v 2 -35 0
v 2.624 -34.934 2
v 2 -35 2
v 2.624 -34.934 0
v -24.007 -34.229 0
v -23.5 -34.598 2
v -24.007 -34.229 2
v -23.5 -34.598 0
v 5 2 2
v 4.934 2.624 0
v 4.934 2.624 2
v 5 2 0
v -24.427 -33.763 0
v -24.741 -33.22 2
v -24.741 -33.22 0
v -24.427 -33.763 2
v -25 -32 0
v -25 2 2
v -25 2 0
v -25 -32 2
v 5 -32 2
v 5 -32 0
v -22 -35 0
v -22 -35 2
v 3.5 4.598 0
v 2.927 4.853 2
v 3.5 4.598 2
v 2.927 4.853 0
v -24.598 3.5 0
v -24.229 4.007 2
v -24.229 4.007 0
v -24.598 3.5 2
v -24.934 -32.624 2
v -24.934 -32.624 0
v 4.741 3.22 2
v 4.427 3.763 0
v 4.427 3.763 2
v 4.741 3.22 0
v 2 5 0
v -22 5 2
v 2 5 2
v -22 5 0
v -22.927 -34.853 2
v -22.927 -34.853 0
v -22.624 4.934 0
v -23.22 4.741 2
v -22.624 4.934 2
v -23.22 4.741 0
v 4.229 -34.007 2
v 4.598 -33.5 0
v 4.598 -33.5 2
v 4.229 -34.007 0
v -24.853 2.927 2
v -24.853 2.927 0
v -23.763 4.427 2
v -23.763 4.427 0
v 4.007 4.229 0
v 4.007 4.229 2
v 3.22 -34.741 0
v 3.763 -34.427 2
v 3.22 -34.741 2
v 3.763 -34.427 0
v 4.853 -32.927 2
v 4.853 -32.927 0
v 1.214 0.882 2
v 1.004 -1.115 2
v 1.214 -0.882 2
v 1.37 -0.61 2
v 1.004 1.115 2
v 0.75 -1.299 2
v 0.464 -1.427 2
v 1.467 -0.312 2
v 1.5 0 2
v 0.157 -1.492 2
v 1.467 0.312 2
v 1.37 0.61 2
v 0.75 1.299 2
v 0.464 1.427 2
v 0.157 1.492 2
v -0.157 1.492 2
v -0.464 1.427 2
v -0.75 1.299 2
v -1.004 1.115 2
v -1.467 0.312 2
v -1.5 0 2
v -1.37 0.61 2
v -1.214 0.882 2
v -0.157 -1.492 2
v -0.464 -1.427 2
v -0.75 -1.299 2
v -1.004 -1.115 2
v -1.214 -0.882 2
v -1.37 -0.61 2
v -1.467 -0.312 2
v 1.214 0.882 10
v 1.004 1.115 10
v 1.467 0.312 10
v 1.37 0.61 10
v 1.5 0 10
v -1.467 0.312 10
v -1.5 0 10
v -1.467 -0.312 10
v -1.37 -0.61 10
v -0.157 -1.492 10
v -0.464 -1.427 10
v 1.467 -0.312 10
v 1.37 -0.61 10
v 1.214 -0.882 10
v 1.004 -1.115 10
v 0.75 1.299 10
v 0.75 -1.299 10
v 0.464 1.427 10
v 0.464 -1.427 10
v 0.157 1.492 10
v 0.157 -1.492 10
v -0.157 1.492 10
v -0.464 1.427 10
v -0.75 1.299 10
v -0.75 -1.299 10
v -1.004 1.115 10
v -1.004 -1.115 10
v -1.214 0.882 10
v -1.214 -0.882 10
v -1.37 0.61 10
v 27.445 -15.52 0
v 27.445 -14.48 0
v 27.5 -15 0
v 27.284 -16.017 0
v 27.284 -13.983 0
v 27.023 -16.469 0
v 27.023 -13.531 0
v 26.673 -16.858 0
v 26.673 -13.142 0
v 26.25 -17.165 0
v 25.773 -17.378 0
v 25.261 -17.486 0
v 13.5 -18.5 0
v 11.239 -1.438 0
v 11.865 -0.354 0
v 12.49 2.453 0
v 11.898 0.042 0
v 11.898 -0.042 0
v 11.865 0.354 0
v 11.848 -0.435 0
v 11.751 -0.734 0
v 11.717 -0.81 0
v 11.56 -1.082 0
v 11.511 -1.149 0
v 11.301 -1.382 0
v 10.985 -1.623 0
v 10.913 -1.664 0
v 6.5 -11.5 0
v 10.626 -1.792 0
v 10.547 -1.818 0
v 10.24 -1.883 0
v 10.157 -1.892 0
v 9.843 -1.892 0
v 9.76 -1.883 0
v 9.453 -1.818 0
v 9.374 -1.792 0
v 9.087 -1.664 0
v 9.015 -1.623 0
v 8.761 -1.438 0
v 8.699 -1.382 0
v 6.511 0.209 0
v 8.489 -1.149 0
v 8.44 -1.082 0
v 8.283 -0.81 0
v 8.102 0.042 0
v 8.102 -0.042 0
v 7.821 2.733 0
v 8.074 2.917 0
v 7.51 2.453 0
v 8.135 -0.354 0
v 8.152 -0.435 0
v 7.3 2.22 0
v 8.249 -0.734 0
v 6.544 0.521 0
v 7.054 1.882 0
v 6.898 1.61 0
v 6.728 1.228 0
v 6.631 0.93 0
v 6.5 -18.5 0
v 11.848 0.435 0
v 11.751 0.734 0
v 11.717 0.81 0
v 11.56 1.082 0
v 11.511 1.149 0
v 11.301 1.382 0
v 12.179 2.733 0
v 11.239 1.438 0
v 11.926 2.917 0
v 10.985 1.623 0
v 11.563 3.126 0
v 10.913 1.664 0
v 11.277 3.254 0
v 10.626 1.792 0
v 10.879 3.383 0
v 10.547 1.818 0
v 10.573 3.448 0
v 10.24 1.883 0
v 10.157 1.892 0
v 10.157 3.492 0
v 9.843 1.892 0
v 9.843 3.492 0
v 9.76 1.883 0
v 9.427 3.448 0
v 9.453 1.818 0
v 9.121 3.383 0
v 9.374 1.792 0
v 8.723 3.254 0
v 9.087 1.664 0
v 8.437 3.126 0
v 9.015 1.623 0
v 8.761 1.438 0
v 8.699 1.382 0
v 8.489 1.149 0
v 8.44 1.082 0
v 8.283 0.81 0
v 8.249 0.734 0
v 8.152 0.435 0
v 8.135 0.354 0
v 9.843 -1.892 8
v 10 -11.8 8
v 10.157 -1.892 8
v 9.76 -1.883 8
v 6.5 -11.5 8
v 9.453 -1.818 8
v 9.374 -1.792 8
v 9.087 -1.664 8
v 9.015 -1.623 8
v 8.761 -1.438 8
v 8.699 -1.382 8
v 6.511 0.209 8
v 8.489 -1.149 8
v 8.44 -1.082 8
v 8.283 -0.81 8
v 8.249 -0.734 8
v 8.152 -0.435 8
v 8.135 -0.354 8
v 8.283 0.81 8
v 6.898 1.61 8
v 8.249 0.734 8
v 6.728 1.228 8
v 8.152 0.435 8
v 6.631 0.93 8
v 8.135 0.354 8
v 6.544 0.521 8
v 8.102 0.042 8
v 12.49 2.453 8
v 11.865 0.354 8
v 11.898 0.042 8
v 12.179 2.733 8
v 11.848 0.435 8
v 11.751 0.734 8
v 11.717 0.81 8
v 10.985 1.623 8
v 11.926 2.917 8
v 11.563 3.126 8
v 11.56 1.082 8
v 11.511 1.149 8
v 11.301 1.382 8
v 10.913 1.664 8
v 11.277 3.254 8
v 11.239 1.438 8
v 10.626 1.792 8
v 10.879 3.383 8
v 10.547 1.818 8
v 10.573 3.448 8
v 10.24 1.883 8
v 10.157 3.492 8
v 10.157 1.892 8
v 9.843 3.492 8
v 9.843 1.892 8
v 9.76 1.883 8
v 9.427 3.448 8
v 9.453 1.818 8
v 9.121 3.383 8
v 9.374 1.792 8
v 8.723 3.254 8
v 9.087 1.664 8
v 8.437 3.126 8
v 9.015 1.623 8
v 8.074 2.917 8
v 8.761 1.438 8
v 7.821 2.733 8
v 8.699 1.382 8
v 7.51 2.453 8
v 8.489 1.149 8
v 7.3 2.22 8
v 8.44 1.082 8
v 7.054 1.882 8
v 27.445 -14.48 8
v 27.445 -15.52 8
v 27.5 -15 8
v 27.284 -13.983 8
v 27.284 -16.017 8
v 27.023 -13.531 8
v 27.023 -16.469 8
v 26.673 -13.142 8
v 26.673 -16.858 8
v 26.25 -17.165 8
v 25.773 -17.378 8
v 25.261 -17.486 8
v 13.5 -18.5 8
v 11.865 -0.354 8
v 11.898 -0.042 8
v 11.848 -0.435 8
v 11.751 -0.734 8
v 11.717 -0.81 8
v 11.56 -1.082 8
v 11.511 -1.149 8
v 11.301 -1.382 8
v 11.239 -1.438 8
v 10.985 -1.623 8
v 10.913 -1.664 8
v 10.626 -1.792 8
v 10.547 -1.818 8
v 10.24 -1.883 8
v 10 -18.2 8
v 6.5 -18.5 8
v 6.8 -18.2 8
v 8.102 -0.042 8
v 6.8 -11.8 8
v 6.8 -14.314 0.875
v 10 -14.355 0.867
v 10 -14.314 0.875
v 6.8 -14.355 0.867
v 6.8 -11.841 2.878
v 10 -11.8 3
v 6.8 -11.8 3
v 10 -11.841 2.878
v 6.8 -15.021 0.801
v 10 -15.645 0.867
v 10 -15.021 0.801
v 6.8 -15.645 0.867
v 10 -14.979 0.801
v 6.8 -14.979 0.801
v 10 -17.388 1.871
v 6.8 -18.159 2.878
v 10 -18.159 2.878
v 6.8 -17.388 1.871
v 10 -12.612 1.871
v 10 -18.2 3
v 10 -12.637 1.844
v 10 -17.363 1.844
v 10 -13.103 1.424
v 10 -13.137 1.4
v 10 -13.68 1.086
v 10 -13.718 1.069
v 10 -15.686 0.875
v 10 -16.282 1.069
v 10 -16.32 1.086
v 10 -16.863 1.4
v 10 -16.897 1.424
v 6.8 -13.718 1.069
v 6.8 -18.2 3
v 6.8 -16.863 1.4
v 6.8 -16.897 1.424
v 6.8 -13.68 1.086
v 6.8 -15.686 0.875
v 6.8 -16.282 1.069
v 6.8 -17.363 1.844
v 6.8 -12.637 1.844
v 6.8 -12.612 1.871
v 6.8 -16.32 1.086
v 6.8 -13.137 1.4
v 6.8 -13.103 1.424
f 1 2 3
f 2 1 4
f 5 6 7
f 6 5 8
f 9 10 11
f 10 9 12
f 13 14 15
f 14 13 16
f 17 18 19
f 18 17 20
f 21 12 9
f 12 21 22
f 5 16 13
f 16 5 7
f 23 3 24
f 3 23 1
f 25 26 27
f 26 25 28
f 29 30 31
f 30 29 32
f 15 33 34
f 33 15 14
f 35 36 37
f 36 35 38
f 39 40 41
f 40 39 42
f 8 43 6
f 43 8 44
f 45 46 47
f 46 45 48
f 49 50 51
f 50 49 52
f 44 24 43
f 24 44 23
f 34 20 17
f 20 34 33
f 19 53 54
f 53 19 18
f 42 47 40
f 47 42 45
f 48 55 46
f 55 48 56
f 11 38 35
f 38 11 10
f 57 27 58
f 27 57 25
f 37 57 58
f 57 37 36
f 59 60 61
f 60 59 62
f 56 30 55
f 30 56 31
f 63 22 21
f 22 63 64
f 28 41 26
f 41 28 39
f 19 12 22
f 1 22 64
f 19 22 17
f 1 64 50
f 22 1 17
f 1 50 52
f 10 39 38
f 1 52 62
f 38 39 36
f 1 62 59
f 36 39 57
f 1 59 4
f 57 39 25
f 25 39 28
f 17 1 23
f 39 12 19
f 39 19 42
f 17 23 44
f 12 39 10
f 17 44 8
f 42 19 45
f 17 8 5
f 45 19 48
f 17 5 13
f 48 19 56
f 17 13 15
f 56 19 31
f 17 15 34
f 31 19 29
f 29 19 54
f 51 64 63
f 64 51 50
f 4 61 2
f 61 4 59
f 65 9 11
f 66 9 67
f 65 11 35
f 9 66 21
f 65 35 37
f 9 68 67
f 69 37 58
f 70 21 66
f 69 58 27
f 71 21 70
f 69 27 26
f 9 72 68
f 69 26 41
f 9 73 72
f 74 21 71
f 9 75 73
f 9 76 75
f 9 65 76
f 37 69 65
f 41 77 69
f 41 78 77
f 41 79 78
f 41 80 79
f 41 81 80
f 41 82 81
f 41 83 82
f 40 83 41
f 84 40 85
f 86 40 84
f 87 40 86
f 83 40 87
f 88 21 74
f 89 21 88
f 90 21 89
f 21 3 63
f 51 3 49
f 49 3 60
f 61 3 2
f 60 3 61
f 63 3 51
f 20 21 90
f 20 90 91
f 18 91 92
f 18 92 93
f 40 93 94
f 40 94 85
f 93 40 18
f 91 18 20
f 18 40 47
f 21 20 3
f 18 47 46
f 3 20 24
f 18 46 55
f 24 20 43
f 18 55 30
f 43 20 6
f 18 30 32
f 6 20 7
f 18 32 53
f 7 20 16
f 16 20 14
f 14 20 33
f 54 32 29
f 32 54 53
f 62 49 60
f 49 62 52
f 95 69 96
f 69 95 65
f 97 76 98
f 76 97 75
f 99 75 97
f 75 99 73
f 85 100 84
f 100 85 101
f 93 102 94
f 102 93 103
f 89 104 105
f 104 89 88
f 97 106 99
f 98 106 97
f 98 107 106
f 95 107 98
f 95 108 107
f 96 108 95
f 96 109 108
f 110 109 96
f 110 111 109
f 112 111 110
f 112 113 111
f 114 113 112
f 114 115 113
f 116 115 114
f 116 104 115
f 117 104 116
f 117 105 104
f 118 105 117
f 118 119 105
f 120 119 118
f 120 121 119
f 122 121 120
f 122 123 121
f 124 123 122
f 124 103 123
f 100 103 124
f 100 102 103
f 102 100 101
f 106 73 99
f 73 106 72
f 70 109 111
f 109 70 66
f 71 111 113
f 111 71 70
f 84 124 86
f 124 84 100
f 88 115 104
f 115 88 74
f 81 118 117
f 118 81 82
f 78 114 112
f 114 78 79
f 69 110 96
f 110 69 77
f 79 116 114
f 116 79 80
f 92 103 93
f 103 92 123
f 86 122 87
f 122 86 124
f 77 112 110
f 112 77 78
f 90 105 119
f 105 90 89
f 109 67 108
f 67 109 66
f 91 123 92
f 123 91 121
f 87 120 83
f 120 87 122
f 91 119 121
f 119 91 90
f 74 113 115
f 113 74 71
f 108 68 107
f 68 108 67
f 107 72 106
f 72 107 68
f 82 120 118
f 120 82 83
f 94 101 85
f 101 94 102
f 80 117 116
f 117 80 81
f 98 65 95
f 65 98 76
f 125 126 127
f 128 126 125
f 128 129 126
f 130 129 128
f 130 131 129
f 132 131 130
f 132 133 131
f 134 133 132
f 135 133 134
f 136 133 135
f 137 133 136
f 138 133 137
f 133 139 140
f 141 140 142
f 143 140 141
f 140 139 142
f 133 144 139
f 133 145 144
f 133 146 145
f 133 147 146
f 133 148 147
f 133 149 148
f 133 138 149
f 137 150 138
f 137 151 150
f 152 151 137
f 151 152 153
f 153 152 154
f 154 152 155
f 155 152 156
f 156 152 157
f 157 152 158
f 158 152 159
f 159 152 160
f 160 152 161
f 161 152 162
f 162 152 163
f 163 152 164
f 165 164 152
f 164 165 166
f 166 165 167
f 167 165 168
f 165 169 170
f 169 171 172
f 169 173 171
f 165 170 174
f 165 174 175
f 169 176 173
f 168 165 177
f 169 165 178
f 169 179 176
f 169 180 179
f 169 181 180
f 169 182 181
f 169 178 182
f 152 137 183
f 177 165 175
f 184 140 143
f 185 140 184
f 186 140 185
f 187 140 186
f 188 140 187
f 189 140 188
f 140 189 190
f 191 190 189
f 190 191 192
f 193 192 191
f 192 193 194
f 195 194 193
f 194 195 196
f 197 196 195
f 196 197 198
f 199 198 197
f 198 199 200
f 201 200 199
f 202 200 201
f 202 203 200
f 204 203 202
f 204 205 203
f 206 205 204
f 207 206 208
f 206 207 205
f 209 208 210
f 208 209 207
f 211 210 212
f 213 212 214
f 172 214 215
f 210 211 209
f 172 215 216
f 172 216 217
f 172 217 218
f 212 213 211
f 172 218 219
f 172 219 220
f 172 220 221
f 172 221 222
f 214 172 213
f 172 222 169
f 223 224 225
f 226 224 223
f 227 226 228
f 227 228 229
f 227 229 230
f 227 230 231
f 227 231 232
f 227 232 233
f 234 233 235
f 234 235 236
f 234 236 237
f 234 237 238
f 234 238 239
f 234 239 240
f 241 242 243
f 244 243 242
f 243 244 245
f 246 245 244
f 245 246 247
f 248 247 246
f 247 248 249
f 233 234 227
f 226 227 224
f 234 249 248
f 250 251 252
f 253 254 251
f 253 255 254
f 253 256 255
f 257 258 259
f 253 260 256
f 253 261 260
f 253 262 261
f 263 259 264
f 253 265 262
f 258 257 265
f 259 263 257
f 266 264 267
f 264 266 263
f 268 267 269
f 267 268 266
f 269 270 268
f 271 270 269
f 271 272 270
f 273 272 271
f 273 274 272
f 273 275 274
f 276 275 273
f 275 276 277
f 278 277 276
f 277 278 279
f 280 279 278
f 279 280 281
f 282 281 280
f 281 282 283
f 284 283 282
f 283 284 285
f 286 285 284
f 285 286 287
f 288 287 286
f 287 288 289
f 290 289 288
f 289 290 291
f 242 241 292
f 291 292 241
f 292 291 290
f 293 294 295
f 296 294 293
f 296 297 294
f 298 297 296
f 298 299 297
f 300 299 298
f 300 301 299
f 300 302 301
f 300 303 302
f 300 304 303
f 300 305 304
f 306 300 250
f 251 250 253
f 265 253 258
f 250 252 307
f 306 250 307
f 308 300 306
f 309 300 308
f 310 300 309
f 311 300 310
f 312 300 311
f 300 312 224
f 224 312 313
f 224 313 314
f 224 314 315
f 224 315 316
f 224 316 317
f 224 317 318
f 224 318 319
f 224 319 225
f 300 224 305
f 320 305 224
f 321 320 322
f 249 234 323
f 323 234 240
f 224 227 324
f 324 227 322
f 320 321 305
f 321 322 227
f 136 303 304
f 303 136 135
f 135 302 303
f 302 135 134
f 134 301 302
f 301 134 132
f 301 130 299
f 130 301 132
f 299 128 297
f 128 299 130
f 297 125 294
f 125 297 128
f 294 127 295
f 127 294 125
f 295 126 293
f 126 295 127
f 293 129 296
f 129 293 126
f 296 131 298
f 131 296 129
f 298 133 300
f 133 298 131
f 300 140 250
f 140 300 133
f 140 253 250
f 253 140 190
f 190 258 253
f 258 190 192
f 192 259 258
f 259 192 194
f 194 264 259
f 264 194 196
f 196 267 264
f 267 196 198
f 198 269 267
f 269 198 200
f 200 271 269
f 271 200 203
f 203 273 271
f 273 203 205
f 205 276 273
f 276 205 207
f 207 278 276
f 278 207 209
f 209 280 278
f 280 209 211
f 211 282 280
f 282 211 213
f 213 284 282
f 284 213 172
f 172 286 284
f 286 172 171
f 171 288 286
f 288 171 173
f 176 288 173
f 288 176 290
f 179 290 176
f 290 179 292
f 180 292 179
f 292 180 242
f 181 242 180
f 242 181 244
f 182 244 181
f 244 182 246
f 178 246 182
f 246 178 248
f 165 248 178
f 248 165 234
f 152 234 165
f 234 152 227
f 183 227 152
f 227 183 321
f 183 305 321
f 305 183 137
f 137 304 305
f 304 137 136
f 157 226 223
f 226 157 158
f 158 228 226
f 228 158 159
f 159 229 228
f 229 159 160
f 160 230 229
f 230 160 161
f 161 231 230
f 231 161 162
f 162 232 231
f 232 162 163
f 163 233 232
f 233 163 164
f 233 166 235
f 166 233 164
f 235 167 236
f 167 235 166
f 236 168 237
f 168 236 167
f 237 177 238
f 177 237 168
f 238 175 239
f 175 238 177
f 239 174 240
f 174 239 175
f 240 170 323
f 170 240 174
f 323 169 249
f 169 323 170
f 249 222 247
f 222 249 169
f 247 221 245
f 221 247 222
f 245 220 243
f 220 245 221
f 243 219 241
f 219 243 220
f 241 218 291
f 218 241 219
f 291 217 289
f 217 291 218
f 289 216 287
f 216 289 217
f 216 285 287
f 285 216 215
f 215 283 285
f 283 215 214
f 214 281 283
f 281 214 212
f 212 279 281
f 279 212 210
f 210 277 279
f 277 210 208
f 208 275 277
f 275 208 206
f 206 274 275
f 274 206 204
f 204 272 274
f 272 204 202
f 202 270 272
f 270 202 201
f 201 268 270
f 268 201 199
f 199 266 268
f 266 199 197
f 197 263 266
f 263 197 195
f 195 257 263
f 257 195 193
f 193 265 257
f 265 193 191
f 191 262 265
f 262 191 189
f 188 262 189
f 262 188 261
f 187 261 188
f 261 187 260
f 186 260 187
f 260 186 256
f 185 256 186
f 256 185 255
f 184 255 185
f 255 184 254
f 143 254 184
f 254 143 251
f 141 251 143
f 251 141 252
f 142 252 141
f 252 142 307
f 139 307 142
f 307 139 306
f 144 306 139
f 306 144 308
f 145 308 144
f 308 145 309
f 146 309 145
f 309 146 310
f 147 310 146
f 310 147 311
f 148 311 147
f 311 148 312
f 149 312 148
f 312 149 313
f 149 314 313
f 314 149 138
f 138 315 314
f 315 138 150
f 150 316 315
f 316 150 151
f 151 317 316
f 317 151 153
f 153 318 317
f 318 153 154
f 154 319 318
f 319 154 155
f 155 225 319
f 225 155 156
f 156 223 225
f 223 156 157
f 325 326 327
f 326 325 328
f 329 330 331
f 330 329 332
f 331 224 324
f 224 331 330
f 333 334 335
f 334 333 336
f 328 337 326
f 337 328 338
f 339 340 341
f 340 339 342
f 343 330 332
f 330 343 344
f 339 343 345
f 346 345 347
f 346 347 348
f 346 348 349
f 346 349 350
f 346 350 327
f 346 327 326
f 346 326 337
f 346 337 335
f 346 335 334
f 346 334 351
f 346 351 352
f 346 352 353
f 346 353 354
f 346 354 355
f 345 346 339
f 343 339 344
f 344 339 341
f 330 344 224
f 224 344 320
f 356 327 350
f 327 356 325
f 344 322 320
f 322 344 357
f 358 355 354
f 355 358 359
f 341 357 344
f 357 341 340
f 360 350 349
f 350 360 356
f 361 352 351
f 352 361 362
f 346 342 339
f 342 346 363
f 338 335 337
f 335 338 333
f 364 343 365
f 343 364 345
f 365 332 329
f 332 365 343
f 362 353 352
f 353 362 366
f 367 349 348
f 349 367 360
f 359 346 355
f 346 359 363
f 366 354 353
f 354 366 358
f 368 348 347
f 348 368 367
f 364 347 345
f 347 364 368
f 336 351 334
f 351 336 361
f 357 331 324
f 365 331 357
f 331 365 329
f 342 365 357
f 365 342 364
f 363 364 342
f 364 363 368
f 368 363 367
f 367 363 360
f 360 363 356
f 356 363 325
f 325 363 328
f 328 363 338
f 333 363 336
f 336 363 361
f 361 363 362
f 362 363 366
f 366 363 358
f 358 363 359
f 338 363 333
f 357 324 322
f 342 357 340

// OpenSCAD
nozzle_d = 0.4;


module lever() {
    linear_extrude(4) {
        difference() {
            hull() {
                circle(d=12);
                translate([0, 30]) circle(d=6);
            }
            circle(d=6);
        }
        translate([0, 30]) circle(d=8);
    }
}


module potentiometer_mount() {
    d = 20;
    l = 15;
    th = 2;
   
    module base_footprint() {
        translate([-d/2, -d/2-3]) square([d, th]);
    }
    
    module fillet() {
        polygon([
            [0, 0],
            [0, 3*th],
            [-th, 3*th],
            [-3*th, th],
            [-3*th, 0]
        ]);
    }
    
    linear_extrude(th) {
        difference() {
            hull() {
                circle(d=d);
                base_footprint();
            }
            circle(d=7);
            translate([-7.8, 0]) offset(r=nozzle_d/2) square([1.2, 2.8], center=true);
        }
    }
    linear_extrude(l) base_footprint();
    
    translate([-(d-th)/2, -d/2-3]) rotate([0, 90, 0]) linear_extrude(th, center=true) fillet();
    translate([(d-th)/2, -d/2-3]) rotate([0, 90, 0]) linear_extrude(th, center=true) fillet();
}

module trigger_assembly() {
    th = 2;
    fulcrum_d = 3;
    magnet_d = 6;
    magnet_th = 2.8;
    trigger_th = max(4, magnet_d+th);

    module base() {
        linear_extrude(th) translate([-25, -35]) offset(r=3) offset(r=-3) square([30, 40]);
        linear_extrude(th+trigger_th) circle(d=fulcrum_d);
    }

    module trigger() {
        difference() {
            linear_extrude(trigger_th) {
                difference() {
                    hull() {
                        offset(r=th) circle(d=fulcrum_d);
                        translate([0, -15]) offset(delta=th) square(fulcrum_d, center=true);
                        translate([15, -15]) circle(d=5);
                    }
                    offset(r=nozzle_d) circle(d=fulcrum_d);
                }
            }
            translate([-th+nozzle_d, -15, (trigger_th-magnet_d)/2]) {
                rotate([0, -90, 0]) {
                    linear_extrude(magnet_th+nozzle_d, center=true) {
                        offset(r=nozzle_d/2) hull() {
                            translate([magnet_d/2, 0]) circle(d=magnet_d);
                            translate([magnet_d, 0]) square([trigger_th, magnet_d], center=true);
                        }
                    }
                }
            }
        }
    }
    
    base();
    if ($preview) {
        translate([0, 0, th+0.1]) trigger();
    } else {
        translate([10, 0, 0]) trigger();
    }
}

translate([-20, 0]) lever($fs=nozzle_d/2);
potentiometer_mount($fs=nozzle_d/2);


!trigger_assembly($fs=nozzle_d/2);
